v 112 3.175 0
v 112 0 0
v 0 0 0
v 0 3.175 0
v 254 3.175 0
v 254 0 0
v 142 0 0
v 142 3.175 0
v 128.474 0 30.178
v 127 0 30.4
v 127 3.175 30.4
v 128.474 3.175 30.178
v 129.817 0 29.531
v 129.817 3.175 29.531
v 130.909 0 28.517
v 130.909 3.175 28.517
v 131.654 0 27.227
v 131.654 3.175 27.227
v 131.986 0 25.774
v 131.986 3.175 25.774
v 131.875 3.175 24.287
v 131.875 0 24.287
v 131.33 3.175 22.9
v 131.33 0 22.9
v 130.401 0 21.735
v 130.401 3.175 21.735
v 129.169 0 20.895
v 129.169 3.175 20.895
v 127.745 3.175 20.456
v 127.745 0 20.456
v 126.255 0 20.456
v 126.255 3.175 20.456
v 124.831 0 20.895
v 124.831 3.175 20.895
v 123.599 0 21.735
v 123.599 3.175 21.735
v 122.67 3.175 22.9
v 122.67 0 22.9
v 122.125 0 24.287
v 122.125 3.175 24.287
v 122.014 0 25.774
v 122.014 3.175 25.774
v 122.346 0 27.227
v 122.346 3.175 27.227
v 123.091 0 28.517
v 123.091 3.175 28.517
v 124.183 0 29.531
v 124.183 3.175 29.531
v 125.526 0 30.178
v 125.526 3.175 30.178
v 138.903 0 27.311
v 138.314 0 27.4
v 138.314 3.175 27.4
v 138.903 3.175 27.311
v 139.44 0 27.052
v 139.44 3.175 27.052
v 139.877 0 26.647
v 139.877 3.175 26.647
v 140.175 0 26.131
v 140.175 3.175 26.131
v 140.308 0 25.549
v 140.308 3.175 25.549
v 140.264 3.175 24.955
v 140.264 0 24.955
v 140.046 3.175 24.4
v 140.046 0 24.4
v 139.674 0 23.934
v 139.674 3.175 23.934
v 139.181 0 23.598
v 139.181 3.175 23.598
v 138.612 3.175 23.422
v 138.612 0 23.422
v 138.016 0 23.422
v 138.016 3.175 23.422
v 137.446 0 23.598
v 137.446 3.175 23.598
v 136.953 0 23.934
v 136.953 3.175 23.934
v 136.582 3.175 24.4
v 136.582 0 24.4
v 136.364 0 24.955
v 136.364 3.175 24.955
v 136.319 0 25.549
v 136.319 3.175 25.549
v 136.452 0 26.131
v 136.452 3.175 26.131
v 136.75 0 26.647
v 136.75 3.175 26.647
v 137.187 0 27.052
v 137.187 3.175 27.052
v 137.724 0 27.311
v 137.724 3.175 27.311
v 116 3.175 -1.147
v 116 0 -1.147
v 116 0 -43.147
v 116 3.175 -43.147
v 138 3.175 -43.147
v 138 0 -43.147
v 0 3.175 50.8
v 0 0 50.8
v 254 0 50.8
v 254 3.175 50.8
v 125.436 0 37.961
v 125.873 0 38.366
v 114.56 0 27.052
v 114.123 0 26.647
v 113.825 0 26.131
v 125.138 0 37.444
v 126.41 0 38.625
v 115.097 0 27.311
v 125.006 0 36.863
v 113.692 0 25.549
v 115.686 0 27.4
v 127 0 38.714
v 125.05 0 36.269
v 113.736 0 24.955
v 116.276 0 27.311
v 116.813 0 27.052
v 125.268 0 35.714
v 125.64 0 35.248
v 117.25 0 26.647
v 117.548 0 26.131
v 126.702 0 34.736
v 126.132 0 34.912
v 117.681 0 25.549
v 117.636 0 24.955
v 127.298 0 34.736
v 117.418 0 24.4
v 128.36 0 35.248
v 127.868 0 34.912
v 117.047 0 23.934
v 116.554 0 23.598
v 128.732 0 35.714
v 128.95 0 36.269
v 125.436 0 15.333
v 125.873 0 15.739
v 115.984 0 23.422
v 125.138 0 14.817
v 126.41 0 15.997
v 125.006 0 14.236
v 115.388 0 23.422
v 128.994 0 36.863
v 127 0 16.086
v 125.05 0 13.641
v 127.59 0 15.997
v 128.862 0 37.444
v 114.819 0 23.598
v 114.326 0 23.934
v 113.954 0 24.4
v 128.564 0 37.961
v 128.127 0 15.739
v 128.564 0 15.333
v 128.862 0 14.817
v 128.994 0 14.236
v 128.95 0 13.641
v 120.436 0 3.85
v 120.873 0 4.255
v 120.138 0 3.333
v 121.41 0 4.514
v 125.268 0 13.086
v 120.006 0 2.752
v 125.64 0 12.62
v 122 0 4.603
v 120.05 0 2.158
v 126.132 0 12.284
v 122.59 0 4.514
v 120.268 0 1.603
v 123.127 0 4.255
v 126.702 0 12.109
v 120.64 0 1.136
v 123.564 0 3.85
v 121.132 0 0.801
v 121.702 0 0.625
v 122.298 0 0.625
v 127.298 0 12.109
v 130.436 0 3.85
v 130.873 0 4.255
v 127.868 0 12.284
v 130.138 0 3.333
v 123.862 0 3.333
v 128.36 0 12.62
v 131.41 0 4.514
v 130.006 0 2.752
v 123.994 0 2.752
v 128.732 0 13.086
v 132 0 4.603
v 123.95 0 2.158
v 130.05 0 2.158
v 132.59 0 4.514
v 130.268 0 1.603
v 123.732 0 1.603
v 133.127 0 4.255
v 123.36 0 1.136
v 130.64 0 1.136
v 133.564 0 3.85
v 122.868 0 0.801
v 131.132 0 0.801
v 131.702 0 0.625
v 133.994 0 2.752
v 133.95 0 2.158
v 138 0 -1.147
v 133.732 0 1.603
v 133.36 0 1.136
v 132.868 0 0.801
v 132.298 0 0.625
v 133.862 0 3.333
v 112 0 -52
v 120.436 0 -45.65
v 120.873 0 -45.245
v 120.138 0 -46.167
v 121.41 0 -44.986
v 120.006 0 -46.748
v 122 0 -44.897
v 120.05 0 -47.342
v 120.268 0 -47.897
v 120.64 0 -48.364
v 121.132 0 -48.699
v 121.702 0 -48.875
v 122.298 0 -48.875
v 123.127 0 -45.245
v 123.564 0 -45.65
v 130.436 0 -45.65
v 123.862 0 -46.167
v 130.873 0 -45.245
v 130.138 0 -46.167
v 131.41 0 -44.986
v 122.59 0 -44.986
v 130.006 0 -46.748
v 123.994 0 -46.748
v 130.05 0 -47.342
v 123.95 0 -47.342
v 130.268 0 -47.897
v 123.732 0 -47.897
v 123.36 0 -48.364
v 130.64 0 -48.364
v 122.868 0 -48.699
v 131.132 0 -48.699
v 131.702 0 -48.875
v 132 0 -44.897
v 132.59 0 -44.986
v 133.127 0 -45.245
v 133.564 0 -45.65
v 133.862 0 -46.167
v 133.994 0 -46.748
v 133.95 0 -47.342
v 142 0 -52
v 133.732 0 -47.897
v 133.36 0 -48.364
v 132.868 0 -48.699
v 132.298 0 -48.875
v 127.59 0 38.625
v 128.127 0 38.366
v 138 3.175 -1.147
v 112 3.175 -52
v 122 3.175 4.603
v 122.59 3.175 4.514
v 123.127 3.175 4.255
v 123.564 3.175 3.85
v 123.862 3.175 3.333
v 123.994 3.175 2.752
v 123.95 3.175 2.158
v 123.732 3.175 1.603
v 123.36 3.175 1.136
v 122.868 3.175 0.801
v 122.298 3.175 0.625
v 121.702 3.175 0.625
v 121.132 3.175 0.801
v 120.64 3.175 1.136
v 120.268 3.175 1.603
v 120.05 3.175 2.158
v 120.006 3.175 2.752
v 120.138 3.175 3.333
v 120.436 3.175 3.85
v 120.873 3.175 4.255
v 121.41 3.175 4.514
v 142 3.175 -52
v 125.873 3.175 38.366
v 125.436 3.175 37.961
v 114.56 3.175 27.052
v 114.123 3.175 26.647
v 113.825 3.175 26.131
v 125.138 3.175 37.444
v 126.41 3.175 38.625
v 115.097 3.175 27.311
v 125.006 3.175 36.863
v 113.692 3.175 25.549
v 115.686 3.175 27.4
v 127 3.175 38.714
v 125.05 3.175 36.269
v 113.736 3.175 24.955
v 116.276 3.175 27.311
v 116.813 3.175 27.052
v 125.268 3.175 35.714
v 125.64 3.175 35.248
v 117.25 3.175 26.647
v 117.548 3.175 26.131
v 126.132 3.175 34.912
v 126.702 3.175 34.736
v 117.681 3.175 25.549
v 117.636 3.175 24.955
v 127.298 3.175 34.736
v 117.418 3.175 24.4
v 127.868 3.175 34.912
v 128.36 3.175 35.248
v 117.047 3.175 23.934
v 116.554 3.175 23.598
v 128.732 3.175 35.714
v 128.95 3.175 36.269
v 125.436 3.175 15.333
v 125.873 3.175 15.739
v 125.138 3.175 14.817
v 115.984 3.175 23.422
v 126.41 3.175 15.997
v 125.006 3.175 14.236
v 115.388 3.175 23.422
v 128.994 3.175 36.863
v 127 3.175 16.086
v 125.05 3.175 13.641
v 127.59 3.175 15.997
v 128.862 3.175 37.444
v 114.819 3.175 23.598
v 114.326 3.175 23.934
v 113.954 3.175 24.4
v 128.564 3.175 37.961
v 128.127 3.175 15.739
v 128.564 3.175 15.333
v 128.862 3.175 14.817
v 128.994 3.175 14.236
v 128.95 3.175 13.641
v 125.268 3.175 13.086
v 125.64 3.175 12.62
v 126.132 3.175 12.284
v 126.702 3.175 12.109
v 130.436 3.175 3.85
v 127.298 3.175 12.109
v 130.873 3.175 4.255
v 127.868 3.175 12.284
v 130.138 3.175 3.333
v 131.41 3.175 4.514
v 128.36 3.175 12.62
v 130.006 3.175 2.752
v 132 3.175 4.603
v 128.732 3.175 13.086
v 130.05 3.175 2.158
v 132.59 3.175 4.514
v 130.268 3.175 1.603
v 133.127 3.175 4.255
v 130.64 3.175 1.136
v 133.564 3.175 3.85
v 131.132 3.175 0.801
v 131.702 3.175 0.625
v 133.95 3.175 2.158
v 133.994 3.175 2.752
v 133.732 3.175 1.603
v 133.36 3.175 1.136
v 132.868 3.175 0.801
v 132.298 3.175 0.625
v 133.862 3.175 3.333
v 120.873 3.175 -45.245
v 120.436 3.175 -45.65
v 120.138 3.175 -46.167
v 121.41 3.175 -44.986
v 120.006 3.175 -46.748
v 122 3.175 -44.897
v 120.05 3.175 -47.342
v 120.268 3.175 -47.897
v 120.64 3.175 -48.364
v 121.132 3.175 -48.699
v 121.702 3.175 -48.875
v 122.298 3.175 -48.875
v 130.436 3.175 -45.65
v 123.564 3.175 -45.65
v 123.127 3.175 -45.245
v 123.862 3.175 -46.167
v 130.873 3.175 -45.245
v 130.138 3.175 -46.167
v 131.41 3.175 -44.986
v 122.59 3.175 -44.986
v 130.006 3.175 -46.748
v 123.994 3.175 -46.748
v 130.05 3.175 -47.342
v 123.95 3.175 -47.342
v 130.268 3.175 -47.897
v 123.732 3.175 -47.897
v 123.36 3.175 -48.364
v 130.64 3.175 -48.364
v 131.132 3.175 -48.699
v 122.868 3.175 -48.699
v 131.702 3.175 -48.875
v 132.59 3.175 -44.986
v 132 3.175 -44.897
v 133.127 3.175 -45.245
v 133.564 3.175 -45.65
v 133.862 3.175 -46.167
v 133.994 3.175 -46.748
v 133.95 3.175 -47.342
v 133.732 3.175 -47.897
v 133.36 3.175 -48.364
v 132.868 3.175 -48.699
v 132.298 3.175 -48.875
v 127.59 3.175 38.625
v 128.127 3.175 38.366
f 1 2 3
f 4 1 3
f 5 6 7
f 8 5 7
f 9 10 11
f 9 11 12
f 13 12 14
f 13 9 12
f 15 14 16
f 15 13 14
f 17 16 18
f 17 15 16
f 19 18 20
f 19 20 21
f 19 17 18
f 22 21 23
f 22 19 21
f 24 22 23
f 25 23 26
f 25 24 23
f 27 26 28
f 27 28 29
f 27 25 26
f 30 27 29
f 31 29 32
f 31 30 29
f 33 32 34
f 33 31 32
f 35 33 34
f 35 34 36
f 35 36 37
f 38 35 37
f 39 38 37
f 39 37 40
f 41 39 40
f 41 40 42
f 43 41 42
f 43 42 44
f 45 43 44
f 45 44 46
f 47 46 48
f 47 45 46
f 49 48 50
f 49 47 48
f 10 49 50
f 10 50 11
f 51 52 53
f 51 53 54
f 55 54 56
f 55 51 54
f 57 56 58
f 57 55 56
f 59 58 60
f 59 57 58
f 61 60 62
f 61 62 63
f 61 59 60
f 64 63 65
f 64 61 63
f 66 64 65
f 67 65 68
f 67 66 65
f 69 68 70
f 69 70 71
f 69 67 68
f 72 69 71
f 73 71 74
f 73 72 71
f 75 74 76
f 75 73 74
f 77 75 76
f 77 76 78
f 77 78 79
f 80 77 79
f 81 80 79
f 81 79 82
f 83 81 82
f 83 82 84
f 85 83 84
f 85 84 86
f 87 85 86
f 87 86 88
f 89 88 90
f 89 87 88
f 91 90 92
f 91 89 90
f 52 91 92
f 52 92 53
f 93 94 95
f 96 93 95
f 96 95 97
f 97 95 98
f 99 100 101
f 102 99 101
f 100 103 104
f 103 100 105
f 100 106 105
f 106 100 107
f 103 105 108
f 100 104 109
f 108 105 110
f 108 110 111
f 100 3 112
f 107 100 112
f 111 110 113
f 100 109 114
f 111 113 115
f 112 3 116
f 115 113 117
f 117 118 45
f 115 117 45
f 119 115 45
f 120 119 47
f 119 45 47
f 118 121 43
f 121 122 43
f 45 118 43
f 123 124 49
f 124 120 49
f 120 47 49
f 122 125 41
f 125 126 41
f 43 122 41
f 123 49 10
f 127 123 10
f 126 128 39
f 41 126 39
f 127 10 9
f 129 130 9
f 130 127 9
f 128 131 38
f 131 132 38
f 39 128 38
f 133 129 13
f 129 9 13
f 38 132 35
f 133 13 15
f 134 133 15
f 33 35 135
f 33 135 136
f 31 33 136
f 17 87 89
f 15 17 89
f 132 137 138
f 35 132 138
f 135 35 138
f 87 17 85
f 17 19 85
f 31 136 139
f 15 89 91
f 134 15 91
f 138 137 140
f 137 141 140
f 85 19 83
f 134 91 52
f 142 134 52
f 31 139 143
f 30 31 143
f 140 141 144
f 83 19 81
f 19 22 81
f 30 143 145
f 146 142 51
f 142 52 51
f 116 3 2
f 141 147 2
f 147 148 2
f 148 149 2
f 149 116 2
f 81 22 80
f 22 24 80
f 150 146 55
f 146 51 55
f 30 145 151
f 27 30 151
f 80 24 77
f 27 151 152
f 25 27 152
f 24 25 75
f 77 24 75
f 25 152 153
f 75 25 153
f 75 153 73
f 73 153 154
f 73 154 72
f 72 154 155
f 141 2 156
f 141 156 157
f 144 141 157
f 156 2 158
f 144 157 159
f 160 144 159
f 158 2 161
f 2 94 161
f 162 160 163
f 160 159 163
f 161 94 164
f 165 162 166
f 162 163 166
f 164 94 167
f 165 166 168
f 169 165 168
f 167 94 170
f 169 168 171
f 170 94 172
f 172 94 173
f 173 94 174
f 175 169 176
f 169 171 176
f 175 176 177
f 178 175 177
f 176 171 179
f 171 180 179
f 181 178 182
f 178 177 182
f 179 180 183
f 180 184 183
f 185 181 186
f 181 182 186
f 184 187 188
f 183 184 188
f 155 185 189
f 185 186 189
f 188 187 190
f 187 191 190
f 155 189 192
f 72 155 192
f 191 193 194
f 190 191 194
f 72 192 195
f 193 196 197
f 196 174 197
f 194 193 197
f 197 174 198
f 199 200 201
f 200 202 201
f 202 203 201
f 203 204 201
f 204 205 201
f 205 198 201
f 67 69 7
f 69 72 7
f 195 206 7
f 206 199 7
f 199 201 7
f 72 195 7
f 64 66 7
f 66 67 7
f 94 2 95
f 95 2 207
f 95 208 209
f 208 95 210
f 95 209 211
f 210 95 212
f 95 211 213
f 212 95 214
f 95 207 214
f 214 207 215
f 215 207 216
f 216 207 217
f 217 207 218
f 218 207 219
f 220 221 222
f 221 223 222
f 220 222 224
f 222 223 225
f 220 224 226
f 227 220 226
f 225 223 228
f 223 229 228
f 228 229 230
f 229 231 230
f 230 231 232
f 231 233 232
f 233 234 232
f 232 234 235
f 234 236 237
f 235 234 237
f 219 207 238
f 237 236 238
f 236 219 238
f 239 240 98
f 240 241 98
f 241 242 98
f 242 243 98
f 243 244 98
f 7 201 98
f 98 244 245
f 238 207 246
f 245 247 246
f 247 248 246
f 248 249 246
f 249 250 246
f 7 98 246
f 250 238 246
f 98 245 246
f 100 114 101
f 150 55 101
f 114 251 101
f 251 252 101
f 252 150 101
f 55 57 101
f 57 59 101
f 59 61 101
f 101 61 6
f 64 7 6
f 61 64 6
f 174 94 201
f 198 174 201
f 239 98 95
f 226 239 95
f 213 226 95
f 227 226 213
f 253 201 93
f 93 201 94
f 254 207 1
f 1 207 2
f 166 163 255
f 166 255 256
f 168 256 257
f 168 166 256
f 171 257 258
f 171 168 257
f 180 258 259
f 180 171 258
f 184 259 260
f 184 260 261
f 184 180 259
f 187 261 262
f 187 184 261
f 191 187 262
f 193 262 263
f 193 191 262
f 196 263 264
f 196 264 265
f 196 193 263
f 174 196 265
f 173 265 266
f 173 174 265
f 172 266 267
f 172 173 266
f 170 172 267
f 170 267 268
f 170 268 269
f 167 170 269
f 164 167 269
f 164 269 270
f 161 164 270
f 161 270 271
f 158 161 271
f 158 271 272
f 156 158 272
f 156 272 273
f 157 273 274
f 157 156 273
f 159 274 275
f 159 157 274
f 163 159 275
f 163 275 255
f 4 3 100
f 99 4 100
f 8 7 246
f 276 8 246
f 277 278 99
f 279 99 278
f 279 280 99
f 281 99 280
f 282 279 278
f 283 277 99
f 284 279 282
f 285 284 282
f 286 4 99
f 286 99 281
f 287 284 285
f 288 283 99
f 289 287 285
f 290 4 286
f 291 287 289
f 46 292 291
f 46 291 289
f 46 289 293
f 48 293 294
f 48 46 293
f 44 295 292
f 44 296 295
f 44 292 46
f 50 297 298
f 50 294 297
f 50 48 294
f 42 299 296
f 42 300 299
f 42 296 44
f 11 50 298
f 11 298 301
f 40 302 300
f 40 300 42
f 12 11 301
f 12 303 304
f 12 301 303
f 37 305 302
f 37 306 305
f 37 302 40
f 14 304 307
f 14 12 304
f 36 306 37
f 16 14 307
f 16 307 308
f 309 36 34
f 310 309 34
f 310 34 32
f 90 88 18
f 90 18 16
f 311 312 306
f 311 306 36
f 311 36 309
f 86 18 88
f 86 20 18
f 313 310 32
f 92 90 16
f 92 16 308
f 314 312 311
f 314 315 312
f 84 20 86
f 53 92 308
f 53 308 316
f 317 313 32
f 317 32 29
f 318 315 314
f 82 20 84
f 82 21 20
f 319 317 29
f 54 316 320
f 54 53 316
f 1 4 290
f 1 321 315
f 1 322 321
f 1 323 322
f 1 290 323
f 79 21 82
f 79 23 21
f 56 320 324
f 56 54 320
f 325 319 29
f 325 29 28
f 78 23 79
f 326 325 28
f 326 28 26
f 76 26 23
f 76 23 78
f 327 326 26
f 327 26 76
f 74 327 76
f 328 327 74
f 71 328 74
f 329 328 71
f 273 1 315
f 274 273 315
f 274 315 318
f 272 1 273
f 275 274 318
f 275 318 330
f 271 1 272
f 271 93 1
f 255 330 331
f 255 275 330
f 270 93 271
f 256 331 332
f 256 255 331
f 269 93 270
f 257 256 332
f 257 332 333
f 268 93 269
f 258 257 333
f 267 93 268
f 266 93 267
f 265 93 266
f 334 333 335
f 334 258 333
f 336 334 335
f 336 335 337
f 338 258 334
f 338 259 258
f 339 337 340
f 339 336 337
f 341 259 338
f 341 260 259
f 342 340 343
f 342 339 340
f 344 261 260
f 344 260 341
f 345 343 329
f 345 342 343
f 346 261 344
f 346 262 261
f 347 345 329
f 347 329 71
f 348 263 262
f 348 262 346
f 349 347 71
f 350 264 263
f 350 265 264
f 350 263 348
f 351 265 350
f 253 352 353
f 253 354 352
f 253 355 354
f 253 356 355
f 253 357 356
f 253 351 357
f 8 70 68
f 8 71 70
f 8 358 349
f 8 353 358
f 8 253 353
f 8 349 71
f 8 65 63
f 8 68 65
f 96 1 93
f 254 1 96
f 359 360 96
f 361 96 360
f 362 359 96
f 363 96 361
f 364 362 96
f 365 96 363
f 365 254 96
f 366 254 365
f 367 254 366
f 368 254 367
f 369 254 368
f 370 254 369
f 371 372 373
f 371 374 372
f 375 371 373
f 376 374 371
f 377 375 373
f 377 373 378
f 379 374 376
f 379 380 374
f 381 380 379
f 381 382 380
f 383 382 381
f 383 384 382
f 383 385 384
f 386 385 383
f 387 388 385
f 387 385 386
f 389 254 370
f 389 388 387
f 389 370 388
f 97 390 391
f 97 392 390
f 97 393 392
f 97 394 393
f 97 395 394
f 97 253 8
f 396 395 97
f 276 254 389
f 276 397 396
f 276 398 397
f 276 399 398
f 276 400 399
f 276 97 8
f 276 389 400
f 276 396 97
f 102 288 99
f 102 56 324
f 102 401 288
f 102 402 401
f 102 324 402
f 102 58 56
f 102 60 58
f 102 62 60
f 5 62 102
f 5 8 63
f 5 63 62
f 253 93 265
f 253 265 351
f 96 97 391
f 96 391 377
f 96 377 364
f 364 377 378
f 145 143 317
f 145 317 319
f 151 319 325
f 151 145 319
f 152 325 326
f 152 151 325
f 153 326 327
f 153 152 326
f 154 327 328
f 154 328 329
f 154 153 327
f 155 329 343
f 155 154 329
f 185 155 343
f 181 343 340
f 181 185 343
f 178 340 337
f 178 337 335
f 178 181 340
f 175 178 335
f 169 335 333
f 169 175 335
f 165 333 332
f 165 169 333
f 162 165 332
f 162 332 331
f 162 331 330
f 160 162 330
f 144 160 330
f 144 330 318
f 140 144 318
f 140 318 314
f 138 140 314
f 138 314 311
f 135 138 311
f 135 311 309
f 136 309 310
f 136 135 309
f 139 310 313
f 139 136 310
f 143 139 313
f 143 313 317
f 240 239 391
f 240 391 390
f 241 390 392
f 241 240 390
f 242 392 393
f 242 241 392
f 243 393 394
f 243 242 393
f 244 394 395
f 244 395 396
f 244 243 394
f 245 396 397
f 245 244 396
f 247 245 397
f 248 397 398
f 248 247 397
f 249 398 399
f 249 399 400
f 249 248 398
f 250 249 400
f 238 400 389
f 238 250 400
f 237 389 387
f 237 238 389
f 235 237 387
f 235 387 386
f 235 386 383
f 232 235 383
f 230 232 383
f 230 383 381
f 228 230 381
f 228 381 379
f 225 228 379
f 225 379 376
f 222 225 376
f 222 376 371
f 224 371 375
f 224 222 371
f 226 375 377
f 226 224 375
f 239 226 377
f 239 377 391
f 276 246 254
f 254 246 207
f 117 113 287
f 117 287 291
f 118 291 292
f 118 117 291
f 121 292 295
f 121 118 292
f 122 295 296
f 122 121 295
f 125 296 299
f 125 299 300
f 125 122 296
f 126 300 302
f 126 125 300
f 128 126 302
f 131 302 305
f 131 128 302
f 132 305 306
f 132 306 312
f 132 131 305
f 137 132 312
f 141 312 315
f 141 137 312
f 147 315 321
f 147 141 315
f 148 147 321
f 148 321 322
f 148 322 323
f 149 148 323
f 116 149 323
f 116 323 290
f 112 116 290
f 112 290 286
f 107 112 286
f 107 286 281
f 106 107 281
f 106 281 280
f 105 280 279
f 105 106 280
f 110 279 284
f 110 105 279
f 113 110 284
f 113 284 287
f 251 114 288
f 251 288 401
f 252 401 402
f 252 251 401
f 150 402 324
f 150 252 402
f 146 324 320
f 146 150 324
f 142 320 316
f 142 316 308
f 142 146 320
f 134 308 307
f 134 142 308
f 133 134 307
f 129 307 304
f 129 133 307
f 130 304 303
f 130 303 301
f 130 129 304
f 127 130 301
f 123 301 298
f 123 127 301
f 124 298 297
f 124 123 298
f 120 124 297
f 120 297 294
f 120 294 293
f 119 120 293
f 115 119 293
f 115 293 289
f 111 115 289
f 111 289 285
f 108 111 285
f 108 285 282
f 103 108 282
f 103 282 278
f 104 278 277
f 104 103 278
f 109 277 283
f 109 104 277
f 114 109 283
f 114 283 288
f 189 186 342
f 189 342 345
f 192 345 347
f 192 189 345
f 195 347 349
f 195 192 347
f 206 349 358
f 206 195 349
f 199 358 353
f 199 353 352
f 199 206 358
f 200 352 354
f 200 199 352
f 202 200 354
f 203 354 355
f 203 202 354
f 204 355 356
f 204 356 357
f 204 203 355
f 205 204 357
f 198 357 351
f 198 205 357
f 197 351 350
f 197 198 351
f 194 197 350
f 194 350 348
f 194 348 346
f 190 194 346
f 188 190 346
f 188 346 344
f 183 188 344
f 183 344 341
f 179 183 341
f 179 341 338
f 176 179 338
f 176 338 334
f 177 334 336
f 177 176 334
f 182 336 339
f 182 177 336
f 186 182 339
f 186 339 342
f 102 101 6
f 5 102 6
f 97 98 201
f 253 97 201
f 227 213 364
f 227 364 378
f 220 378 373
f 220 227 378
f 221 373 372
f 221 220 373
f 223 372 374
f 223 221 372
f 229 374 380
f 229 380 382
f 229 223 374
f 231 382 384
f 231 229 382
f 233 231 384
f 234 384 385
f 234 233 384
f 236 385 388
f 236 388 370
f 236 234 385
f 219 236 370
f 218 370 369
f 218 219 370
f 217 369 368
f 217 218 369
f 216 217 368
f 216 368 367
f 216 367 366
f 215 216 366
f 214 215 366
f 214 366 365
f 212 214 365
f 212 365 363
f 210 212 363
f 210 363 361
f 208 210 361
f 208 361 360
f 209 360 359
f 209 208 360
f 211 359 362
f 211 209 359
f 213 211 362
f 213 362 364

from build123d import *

# Parameters (mm, degrees)
SKETCH1_R           = 2
SKETCH1_R_2         = 5
BOSS_EXTRUDE1_DEPTH = 3.175


with BuildPart() as part:
    # Sketch1 → Boss-Extrude1 (new body)
    with BuildSketch(Plane(origin=(0, 0, 0), x_dir=(1, 0, 0), z_dir=(0, 1, 0))):
        Polygon((254, 0), (142, 0), (142, 52), (112, 52), (112, 0), (0, 0), (0, -50.8), (254, -50.8), align=None)
        with Locations(Location((127, -36.713708499, 0), (0, 0, 270))):
            Circle(SKETCH1_R, mode=Mode.SUBTRACT)
        with Locations(Location((115.686291501, -25.4, 0), (0, 0, 270))):
            Circle(SKETCH1_R, mode=Mode.SUBTRACT)
        with Locations(Location((127, -25.4, 0), (0, 0, 270))):
            Circle(SKETCH1_R_2, mode=Mode.SUBTRACT)
        with Locations(Location((138.313708499, -25.4, 0), (0, 0, 270))):
            Circle(SKETCH1_R, mode=Mode.SUBTRACT)
        with Locations(Location((122, -2.6025933, 0), (0, 0, 270))):
            Circle(SKETCH1_R, mode=Mode.SUBTRACT)
        with Locations(Location((127, -14.086291501, 0), (0, 0, 270))):
            Circle(SKETCH1_R, mode=Mode.SUBTRACT)
        with Locations(Location((132, -2.6025933, 0), (0, 0, 270))):
            Circle(SKETCH1_R, mode=Mode.SUBTRACT)
        Polygon((138, 1.1474067), (127, 1.1474067), (116, 1.1474067), (116, 43.1474067), (127, 43.1474067), (138, 43.1474067), align=None, mode=Mode.SUBTRACT)
        with Locations(Location((122, 46.8974067, 0), (0, 0, 270))):
            Circle(SKETCH1_R, mode=Mode.SUBTRACT)
        with Locations(Location((132, 46.8974067, 0), (0, 0, 270))):
            Circle(SKETCH1_R, mode=Mode.SUBTRACT)
    extrude(amount=BOSS_EXTRUDE1_DEPTH)


solid = part.part
